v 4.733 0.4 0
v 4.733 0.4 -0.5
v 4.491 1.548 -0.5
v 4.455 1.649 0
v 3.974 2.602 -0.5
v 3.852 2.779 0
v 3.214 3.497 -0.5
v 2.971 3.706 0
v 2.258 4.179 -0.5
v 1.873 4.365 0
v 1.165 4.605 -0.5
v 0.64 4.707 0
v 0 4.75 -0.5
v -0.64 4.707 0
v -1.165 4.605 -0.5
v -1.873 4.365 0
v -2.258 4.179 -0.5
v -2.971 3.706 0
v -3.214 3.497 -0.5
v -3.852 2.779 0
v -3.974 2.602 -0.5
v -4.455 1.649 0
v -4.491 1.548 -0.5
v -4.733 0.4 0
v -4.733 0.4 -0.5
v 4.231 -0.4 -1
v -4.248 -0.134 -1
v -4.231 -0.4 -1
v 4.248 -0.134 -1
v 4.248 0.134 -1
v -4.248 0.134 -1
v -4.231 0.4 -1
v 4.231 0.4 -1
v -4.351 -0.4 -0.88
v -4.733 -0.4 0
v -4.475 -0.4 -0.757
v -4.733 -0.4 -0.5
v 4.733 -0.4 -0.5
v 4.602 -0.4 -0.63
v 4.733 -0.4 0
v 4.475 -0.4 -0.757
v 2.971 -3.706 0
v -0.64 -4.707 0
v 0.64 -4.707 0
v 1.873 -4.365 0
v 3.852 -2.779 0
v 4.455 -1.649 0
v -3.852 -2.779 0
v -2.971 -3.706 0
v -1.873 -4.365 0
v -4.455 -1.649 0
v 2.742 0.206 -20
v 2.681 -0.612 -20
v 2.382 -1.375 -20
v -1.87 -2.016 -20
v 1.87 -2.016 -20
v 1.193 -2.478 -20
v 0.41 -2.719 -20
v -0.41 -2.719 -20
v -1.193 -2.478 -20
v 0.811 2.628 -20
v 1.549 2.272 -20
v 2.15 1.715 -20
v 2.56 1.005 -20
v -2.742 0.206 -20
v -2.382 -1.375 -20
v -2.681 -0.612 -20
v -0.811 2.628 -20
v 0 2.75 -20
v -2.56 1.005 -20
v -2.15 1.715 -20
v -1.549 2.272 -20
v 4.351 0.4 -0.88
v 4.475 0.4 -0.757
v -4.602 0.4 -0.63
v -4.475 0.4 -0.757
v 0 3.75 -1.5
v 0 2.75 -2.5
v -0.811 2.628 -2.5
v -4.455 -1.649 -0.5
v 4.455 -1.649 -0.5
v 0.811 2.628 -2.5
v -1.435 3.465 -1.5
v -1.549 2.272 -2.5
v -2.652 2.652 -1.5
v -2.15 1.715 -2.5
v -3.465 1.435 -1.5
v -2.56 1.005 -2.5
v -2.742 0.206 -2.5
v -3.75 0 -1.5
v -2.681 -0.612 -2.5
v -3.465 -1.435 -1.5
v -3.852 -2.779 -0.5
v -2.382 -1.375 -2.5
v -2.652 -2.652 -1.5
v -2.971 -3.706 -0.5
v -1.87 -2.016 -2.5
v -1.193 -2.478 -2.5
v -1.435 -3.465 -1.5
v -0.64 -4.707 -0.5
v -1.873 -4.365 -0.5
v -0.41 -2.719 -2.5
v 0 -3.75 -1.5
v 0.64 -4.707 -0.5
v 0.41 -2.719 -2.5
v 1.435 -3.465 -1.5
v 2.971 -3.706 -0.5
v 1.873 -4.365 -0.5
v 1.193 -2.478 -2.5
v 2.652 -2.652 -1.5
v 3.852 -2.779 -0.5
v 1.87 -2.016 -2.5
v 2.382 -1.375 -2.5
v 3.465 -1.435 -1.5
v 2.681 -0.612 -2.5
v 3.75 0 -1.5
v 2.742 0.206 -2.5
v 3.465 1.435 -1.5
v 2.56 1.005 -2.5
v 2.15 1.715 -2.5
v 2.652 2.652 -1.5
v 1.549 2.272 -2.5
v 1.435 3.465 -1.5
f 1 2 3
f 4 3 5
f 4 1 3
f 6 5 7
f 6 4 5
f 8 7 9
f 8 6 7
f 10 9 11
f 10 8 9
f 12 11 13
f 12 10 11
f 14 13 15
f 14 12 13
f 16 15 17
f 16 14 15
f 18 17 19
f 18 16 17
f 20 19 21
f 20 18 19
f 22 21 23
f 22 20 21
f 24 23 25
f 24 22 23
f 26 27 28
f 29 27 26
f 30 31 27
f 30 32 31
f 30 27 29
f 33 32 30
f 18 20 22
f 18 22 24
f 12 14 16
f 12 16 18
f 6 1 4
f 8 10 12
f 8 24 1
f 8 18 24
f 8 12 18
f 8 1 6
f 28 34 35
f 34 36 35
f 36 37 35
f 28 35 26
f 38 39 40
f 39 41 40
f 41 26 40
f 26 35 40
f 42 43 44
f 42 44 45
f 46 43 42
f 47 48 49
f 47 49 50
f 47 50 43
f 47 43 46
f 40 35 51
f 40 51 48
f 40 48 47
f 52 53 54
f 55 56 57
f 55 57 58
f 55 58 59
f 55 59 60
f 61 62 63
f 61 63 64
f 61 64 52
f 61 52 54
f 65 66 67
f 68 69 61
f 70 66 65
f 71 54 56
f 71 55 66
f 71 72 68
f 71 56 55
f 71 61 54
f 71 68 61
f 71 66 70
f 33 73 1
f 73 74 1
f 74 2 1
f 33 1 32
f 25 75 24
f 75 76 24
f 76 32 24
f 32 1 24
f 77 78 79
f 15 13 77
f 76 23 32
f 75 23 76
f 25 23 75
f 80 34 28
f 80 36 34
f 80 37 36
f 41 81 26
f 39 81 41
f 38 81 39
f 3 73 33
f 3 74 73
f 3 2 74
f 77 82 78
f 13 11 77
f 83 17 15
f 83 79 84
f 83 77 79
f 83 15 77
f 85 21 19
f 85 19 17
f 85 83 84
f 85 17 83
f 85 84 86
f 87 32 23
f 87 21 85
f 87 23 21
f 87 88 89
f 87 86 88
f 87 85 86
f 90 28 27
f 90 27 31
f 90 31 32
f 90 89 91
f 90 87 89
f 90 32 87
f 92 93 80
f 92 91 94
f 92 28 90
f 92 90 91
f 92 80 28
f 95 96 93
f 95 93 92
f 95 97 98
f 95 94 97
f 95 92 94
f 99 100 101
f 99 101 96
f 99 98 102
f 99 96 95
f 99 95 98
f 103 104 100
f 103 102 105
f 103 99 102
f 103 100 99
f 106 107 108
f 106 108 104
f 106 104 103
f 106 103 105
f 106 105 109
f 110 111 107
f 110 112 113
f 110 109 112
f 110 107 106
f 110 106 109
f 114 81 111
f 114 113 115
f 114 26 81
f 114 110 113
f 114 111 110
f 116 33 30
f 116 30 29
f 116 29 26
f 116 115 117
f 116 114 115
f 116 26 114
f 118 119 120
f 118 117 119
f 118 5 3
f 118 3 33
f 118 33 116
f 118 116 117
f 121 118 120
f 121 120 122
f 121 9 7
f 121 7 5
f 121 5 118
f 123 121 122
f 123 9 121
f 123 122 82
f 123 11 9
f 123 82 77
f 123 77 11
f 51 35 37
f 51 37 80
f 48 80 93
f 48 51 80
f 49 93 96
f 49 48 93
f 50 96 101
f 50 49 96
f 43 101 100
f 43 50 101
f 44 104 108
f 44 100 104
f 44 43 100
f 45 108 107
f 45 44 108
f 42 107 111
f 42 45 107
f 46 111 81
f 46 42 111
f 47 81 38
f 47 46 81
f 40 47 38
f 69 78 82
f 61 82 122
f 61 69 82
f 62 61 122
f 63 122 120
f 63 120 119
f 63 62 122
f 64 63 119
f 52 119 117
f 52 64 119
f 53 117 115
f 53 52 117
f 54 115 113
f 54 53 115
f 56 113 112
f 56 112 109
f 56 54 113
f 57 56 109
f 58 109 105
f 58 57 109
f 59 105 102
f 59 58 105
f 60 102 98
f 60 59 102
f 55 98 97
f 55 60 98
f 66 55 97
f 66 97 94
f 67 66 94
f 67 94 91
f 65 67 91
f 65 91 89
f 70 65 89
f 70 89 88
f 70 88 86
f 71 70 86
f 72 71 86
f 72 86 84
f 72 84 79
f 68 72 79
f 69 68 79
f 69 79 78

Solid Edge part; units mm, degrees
sketch "Sketch1" plane through (0, 0, 0) normal (0, 0, 1) x (1, 0, 0)
  circle A0 centre (0, 0) radius 4.75
extrude "拉伸_4" add sketch "Sketch1" against normal blind 2.7
sketch "Sketch2" plane through (0, 0, 0) normal (0, 0, 1) x (1, 0, 0)
  line L0 (-5, -0.4) -> (5, -0.4)
  line L1 (5, -0.4) -> (5, 0.4)
  line L2 (5, 0.4) -> (-5, 0.4)
  line L3 (-5, 0.4) -> (-5, -0.4)
extrude "拉伸除料_2" cut sketch "Sketch2" against normal blind 1
sketch "Sketch3" plane through (0, 0, 0) normal (1, 0, 0) x (0, 1, 0)
  line L0 (4.75, -0.5) -> (2.55, -2.7)
  line L1 (2.55, -2.7) -> (5.5063, -2.7)
  line L2 (5.5063, -2.7) -> (4.75, -0.5)
revolve "RevolvedCutout1" cut sketch "Sketch3" angle 360 about axis through (0, 0, 0) along (0, 0, -1)
sketch "Sketch4" plane through (0, 0, -2.7) normal (0, 0, -1) x (0, 1, 0)
  circle A0 centre (0, 0) radius 2.75
extrude "拉伸_6" add sketch "Sketch4" along normal blind 17.3 and the other way blind 0.4309
cosmetic_thread "Thread1" size "M5.5"
properties material "不锈钢310"
